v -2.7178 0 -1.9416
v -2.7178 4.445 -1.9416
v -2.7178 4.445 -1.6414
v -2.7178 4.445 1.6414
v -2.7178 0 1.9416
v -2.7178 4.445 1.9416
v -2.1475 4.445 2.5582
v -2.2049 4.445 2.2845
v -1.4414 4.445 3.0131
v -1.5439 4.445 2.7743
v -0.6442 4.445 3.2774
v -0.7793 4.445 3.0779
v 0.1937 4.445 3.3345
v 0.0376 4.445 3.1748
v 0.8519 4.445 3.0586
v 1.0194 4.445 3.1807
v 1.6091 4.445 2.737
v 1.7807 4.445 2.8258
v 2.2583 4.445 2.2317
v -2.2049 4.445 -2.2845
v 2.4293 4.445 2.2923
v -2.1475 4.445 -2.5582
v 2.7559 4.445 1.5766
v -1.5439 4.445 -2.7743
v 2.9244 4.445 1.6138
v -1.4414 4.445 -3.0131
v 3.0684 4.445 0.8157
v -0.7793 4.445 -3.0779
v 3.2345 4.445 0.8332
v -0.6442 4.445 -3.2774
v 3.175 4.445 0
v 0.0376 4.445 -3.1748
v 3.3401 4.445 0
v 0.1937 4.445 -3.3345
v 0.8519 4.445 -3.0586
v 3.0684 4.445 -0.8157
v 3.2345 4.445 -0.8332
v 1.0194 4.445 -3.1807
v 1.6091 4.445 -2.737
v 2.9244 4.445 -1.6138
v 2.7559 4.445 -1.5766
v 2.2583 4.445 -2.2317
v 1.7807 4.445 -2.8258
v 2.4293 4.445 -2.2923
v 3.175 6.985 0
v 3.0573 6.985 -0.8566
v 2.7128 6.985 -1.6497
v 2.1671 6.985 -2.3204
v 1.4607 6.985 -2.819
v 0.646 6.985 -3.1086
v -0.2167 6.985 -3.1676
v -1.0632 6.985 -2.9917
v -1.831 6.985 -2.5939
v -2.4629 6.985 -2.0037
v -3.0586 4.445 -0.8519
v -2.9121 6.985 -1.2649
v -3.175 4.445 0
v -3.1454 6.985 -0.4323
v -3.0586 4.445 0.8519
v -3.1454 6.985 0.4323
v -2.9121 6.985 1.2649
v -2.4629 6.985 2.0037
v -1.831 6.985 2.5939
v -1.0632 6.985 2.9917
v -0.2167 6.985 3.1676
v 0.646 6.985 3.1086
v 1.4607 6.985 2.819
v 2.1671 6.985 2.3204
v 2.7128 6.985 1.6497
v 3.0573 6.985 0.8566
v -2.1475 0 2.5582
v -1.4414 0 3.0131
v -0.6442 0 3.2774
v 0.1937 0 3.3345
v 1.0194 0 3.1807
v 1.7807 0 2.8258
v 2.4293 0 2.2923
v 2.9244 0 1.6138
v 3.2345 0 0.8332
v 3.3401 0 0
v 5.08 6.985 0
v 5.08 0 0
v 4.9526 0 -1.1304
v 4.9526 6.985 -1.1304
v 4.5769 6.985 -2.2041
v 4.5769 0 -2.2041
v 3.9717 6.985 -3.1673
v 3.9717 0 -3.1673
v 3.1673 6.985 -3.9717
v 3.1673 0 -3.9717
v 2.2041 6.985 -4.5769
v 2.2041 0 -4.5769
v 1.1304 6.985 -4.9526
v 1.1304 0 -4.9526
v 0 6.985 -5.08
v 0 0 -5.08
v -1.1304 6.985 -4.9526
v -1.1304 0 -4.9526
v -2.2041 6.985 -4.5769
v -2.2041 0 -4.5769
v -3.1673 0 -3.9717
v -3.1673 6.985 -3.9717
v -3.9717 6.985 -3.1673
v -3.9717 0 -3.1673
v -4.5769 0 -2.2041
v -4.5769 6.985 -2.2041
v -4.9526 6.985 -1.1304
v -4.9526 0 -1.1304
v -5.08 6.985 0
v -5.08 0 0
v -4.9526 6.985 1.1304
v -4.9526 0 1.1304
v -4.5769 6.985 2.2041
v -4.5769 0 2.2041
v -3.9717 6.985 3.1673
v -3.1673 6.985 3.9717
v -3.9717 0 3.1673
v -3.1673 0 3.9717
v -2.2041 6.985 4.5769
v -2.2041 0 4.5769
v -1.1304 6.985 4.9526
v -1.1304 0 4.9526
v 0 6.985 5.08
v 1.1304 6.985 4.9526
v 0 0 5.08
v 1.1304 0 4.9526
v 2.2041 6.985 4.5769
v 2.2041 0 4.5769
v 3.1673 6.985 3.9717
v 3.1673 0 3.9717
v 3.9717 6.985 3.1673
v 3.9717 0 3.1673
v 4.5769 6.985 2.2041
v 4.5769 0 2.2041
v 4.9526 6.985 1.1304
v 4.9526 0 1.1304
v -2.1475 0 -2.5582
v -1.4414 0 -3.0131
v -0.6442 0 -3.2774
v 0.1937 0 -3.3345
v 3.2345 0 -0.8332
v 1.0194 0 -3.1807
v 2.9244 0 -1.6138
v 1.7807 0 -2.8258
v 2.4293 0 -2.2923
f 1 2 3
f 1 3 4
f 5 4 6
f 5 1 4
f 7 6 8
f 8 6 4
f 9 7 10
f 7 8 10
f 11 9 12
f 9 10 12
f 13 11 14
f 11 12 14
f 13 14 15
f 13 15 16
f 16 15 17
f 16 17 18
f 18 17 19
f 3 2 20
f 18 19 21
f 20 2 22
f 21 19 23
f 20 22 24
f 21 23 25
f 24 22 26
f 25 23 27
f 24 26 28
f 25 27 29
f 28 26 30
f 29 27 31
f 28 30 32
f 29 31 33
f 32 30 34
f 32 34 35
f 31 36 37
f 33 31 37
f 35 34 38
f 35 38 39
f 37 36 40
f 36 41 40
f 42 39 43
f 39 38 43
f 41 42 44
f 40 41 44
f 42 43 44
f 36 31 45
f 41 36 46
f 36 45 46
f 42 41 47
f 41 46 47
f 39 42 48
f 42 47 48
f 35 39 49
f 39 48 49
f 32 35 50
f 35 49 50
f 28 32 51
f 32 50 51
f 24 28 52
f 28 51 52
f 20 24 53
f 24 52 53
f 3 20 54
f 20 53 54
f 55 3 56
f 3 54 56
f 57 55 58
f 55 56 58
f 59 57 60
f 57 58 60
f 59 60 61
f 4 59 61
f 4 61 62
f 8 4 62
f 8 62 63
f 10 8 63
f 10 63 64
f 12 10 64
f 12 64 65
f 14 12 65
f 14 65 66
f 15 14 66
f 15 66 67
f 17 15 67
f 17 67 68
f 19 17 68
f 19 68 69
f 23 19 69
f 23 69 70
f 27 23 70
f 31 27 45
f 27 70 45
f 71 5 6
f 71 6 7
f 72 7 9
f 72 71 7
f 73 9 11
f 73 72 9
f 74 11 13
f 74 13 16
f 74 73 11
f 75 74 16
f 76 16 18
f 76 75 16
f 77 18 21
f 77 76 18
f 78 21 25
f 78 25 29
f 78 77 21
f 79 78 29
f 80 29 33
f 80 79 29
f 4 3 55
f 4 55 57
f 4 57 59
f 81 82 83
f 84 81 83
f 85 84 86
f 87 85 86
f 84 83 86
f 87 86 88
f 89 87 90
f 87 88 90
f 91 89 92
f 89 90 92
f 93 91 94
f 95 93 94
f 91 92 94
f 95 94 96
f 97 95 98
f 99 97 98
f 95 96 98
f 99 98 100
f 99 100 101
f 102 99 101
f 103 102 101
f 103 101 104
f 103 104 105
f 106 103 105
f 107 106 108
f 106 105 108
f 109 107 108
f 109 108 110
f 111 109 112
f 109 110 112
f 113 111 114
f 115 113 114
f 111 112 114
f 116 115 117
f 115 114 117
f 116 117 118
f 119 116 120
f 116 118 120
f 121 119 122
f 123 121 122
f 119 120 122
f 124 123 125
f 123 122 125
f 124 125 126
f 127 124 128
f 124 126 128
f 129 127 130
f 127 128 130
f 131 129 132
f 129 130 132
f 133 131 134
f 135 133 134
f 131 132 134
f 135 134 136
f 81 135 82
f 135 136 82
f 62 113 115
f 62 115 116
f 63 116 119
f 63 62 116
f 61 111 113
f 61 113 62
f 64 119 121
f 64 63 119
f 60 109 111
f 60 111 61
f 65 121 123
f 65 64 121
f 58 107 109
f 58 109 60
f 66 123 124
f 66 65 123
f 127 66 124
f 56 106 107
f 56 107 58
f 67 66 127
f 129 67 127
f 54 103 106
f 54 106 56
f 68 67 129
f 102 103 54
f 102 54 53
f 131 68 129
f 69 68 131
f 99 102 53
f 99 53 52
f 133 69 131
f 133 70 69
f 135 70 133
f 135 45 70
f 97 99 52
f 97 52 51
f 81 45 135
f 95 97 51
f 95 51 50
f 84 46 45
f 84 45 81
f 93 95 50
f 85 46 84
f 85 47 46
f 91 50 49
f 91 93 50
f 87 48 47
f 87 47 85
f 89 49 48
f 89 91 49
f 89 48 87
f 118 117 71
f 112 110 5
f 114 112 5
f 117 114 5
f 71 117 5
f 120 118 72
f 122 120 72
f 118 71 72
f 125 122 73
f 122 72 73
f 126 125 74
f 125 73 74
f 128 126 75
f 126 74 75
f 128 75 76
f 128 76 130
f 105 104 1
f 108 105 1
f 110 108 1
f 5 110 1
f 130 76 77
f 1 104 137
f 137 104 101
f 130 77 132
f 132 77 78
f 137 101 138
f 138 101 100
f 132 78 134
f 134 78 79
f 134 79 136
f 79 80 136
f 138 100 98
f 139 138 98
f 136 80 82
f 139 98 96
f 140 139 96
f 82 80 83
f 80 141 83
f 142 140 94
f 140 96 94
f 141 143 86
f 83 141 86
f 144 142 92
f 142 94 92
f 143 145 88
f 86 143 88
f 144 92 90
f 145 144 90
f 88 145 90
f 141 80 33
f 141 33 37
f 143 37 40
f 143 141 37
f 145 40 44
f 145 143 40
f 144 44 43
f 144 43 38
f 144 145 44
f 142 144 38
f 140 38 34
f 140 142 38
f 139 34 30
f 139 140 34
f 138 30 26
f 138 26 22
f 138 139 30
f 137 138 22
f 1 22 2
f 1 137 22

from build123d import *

# Parameters (mm, degrees)
SKETCH1_R           = 5.08
BOSS_EXTRUDE1_DEPTH = 6.985
CUT_EXTRUDE1_DEPTH  = 4.445
SKETCH3_R           = 3.175
CUT_EXTRUDE2_DEPTH  = 2.54


with BuildPart() as part:
    # Sketch1 → Boss-Extrude1 (new body)
    with BuildSketch(Plane(origin=(0, 0, 0), x_dir=(1, 0, 0), z_dir=(0, 1, 0))):
        Circle(SKETCH1_R)
    extrude(amount=BOSS_EXTRUDE1_DEPTH)

    # Sketch2 → Cut-Extrude1 (cut)
    with BuildSketch(Plane(origin=(0, 0, 0), x_dir=(1, 0, 0), z_dir=(0, 1, 0))):
        with BuildLine():
            Line((-2.7178, 1.941605307), (-2.7178, -1.941605307))
            ThreePointArc((-2.7178, -1.941605307), (1.019446965, -3.180722543), (3.3401, 0))
            ThreePointArc((3.3401, 0), (1.019446965, 3.180722543), (-2.7178, 1.941605307))
        make_face()
    extrude(amount=CUT_EXTRUDE1_DEPTH, mode=Mode.SUBTRACT)

    # Sketch3 → Cut-Extrude2 (cut)
    with BuildSketch(Plane(origin=(0, 6.985, 0), x_dir=(1, 0, 0), z_dir=(0, 1, 0))):
        Circle(SKETCH3_R)
    extrude(amount=-CUT_EXTRUDE2_DEPTH, mode=Mode.SUBTRACT)


solid = part.part
